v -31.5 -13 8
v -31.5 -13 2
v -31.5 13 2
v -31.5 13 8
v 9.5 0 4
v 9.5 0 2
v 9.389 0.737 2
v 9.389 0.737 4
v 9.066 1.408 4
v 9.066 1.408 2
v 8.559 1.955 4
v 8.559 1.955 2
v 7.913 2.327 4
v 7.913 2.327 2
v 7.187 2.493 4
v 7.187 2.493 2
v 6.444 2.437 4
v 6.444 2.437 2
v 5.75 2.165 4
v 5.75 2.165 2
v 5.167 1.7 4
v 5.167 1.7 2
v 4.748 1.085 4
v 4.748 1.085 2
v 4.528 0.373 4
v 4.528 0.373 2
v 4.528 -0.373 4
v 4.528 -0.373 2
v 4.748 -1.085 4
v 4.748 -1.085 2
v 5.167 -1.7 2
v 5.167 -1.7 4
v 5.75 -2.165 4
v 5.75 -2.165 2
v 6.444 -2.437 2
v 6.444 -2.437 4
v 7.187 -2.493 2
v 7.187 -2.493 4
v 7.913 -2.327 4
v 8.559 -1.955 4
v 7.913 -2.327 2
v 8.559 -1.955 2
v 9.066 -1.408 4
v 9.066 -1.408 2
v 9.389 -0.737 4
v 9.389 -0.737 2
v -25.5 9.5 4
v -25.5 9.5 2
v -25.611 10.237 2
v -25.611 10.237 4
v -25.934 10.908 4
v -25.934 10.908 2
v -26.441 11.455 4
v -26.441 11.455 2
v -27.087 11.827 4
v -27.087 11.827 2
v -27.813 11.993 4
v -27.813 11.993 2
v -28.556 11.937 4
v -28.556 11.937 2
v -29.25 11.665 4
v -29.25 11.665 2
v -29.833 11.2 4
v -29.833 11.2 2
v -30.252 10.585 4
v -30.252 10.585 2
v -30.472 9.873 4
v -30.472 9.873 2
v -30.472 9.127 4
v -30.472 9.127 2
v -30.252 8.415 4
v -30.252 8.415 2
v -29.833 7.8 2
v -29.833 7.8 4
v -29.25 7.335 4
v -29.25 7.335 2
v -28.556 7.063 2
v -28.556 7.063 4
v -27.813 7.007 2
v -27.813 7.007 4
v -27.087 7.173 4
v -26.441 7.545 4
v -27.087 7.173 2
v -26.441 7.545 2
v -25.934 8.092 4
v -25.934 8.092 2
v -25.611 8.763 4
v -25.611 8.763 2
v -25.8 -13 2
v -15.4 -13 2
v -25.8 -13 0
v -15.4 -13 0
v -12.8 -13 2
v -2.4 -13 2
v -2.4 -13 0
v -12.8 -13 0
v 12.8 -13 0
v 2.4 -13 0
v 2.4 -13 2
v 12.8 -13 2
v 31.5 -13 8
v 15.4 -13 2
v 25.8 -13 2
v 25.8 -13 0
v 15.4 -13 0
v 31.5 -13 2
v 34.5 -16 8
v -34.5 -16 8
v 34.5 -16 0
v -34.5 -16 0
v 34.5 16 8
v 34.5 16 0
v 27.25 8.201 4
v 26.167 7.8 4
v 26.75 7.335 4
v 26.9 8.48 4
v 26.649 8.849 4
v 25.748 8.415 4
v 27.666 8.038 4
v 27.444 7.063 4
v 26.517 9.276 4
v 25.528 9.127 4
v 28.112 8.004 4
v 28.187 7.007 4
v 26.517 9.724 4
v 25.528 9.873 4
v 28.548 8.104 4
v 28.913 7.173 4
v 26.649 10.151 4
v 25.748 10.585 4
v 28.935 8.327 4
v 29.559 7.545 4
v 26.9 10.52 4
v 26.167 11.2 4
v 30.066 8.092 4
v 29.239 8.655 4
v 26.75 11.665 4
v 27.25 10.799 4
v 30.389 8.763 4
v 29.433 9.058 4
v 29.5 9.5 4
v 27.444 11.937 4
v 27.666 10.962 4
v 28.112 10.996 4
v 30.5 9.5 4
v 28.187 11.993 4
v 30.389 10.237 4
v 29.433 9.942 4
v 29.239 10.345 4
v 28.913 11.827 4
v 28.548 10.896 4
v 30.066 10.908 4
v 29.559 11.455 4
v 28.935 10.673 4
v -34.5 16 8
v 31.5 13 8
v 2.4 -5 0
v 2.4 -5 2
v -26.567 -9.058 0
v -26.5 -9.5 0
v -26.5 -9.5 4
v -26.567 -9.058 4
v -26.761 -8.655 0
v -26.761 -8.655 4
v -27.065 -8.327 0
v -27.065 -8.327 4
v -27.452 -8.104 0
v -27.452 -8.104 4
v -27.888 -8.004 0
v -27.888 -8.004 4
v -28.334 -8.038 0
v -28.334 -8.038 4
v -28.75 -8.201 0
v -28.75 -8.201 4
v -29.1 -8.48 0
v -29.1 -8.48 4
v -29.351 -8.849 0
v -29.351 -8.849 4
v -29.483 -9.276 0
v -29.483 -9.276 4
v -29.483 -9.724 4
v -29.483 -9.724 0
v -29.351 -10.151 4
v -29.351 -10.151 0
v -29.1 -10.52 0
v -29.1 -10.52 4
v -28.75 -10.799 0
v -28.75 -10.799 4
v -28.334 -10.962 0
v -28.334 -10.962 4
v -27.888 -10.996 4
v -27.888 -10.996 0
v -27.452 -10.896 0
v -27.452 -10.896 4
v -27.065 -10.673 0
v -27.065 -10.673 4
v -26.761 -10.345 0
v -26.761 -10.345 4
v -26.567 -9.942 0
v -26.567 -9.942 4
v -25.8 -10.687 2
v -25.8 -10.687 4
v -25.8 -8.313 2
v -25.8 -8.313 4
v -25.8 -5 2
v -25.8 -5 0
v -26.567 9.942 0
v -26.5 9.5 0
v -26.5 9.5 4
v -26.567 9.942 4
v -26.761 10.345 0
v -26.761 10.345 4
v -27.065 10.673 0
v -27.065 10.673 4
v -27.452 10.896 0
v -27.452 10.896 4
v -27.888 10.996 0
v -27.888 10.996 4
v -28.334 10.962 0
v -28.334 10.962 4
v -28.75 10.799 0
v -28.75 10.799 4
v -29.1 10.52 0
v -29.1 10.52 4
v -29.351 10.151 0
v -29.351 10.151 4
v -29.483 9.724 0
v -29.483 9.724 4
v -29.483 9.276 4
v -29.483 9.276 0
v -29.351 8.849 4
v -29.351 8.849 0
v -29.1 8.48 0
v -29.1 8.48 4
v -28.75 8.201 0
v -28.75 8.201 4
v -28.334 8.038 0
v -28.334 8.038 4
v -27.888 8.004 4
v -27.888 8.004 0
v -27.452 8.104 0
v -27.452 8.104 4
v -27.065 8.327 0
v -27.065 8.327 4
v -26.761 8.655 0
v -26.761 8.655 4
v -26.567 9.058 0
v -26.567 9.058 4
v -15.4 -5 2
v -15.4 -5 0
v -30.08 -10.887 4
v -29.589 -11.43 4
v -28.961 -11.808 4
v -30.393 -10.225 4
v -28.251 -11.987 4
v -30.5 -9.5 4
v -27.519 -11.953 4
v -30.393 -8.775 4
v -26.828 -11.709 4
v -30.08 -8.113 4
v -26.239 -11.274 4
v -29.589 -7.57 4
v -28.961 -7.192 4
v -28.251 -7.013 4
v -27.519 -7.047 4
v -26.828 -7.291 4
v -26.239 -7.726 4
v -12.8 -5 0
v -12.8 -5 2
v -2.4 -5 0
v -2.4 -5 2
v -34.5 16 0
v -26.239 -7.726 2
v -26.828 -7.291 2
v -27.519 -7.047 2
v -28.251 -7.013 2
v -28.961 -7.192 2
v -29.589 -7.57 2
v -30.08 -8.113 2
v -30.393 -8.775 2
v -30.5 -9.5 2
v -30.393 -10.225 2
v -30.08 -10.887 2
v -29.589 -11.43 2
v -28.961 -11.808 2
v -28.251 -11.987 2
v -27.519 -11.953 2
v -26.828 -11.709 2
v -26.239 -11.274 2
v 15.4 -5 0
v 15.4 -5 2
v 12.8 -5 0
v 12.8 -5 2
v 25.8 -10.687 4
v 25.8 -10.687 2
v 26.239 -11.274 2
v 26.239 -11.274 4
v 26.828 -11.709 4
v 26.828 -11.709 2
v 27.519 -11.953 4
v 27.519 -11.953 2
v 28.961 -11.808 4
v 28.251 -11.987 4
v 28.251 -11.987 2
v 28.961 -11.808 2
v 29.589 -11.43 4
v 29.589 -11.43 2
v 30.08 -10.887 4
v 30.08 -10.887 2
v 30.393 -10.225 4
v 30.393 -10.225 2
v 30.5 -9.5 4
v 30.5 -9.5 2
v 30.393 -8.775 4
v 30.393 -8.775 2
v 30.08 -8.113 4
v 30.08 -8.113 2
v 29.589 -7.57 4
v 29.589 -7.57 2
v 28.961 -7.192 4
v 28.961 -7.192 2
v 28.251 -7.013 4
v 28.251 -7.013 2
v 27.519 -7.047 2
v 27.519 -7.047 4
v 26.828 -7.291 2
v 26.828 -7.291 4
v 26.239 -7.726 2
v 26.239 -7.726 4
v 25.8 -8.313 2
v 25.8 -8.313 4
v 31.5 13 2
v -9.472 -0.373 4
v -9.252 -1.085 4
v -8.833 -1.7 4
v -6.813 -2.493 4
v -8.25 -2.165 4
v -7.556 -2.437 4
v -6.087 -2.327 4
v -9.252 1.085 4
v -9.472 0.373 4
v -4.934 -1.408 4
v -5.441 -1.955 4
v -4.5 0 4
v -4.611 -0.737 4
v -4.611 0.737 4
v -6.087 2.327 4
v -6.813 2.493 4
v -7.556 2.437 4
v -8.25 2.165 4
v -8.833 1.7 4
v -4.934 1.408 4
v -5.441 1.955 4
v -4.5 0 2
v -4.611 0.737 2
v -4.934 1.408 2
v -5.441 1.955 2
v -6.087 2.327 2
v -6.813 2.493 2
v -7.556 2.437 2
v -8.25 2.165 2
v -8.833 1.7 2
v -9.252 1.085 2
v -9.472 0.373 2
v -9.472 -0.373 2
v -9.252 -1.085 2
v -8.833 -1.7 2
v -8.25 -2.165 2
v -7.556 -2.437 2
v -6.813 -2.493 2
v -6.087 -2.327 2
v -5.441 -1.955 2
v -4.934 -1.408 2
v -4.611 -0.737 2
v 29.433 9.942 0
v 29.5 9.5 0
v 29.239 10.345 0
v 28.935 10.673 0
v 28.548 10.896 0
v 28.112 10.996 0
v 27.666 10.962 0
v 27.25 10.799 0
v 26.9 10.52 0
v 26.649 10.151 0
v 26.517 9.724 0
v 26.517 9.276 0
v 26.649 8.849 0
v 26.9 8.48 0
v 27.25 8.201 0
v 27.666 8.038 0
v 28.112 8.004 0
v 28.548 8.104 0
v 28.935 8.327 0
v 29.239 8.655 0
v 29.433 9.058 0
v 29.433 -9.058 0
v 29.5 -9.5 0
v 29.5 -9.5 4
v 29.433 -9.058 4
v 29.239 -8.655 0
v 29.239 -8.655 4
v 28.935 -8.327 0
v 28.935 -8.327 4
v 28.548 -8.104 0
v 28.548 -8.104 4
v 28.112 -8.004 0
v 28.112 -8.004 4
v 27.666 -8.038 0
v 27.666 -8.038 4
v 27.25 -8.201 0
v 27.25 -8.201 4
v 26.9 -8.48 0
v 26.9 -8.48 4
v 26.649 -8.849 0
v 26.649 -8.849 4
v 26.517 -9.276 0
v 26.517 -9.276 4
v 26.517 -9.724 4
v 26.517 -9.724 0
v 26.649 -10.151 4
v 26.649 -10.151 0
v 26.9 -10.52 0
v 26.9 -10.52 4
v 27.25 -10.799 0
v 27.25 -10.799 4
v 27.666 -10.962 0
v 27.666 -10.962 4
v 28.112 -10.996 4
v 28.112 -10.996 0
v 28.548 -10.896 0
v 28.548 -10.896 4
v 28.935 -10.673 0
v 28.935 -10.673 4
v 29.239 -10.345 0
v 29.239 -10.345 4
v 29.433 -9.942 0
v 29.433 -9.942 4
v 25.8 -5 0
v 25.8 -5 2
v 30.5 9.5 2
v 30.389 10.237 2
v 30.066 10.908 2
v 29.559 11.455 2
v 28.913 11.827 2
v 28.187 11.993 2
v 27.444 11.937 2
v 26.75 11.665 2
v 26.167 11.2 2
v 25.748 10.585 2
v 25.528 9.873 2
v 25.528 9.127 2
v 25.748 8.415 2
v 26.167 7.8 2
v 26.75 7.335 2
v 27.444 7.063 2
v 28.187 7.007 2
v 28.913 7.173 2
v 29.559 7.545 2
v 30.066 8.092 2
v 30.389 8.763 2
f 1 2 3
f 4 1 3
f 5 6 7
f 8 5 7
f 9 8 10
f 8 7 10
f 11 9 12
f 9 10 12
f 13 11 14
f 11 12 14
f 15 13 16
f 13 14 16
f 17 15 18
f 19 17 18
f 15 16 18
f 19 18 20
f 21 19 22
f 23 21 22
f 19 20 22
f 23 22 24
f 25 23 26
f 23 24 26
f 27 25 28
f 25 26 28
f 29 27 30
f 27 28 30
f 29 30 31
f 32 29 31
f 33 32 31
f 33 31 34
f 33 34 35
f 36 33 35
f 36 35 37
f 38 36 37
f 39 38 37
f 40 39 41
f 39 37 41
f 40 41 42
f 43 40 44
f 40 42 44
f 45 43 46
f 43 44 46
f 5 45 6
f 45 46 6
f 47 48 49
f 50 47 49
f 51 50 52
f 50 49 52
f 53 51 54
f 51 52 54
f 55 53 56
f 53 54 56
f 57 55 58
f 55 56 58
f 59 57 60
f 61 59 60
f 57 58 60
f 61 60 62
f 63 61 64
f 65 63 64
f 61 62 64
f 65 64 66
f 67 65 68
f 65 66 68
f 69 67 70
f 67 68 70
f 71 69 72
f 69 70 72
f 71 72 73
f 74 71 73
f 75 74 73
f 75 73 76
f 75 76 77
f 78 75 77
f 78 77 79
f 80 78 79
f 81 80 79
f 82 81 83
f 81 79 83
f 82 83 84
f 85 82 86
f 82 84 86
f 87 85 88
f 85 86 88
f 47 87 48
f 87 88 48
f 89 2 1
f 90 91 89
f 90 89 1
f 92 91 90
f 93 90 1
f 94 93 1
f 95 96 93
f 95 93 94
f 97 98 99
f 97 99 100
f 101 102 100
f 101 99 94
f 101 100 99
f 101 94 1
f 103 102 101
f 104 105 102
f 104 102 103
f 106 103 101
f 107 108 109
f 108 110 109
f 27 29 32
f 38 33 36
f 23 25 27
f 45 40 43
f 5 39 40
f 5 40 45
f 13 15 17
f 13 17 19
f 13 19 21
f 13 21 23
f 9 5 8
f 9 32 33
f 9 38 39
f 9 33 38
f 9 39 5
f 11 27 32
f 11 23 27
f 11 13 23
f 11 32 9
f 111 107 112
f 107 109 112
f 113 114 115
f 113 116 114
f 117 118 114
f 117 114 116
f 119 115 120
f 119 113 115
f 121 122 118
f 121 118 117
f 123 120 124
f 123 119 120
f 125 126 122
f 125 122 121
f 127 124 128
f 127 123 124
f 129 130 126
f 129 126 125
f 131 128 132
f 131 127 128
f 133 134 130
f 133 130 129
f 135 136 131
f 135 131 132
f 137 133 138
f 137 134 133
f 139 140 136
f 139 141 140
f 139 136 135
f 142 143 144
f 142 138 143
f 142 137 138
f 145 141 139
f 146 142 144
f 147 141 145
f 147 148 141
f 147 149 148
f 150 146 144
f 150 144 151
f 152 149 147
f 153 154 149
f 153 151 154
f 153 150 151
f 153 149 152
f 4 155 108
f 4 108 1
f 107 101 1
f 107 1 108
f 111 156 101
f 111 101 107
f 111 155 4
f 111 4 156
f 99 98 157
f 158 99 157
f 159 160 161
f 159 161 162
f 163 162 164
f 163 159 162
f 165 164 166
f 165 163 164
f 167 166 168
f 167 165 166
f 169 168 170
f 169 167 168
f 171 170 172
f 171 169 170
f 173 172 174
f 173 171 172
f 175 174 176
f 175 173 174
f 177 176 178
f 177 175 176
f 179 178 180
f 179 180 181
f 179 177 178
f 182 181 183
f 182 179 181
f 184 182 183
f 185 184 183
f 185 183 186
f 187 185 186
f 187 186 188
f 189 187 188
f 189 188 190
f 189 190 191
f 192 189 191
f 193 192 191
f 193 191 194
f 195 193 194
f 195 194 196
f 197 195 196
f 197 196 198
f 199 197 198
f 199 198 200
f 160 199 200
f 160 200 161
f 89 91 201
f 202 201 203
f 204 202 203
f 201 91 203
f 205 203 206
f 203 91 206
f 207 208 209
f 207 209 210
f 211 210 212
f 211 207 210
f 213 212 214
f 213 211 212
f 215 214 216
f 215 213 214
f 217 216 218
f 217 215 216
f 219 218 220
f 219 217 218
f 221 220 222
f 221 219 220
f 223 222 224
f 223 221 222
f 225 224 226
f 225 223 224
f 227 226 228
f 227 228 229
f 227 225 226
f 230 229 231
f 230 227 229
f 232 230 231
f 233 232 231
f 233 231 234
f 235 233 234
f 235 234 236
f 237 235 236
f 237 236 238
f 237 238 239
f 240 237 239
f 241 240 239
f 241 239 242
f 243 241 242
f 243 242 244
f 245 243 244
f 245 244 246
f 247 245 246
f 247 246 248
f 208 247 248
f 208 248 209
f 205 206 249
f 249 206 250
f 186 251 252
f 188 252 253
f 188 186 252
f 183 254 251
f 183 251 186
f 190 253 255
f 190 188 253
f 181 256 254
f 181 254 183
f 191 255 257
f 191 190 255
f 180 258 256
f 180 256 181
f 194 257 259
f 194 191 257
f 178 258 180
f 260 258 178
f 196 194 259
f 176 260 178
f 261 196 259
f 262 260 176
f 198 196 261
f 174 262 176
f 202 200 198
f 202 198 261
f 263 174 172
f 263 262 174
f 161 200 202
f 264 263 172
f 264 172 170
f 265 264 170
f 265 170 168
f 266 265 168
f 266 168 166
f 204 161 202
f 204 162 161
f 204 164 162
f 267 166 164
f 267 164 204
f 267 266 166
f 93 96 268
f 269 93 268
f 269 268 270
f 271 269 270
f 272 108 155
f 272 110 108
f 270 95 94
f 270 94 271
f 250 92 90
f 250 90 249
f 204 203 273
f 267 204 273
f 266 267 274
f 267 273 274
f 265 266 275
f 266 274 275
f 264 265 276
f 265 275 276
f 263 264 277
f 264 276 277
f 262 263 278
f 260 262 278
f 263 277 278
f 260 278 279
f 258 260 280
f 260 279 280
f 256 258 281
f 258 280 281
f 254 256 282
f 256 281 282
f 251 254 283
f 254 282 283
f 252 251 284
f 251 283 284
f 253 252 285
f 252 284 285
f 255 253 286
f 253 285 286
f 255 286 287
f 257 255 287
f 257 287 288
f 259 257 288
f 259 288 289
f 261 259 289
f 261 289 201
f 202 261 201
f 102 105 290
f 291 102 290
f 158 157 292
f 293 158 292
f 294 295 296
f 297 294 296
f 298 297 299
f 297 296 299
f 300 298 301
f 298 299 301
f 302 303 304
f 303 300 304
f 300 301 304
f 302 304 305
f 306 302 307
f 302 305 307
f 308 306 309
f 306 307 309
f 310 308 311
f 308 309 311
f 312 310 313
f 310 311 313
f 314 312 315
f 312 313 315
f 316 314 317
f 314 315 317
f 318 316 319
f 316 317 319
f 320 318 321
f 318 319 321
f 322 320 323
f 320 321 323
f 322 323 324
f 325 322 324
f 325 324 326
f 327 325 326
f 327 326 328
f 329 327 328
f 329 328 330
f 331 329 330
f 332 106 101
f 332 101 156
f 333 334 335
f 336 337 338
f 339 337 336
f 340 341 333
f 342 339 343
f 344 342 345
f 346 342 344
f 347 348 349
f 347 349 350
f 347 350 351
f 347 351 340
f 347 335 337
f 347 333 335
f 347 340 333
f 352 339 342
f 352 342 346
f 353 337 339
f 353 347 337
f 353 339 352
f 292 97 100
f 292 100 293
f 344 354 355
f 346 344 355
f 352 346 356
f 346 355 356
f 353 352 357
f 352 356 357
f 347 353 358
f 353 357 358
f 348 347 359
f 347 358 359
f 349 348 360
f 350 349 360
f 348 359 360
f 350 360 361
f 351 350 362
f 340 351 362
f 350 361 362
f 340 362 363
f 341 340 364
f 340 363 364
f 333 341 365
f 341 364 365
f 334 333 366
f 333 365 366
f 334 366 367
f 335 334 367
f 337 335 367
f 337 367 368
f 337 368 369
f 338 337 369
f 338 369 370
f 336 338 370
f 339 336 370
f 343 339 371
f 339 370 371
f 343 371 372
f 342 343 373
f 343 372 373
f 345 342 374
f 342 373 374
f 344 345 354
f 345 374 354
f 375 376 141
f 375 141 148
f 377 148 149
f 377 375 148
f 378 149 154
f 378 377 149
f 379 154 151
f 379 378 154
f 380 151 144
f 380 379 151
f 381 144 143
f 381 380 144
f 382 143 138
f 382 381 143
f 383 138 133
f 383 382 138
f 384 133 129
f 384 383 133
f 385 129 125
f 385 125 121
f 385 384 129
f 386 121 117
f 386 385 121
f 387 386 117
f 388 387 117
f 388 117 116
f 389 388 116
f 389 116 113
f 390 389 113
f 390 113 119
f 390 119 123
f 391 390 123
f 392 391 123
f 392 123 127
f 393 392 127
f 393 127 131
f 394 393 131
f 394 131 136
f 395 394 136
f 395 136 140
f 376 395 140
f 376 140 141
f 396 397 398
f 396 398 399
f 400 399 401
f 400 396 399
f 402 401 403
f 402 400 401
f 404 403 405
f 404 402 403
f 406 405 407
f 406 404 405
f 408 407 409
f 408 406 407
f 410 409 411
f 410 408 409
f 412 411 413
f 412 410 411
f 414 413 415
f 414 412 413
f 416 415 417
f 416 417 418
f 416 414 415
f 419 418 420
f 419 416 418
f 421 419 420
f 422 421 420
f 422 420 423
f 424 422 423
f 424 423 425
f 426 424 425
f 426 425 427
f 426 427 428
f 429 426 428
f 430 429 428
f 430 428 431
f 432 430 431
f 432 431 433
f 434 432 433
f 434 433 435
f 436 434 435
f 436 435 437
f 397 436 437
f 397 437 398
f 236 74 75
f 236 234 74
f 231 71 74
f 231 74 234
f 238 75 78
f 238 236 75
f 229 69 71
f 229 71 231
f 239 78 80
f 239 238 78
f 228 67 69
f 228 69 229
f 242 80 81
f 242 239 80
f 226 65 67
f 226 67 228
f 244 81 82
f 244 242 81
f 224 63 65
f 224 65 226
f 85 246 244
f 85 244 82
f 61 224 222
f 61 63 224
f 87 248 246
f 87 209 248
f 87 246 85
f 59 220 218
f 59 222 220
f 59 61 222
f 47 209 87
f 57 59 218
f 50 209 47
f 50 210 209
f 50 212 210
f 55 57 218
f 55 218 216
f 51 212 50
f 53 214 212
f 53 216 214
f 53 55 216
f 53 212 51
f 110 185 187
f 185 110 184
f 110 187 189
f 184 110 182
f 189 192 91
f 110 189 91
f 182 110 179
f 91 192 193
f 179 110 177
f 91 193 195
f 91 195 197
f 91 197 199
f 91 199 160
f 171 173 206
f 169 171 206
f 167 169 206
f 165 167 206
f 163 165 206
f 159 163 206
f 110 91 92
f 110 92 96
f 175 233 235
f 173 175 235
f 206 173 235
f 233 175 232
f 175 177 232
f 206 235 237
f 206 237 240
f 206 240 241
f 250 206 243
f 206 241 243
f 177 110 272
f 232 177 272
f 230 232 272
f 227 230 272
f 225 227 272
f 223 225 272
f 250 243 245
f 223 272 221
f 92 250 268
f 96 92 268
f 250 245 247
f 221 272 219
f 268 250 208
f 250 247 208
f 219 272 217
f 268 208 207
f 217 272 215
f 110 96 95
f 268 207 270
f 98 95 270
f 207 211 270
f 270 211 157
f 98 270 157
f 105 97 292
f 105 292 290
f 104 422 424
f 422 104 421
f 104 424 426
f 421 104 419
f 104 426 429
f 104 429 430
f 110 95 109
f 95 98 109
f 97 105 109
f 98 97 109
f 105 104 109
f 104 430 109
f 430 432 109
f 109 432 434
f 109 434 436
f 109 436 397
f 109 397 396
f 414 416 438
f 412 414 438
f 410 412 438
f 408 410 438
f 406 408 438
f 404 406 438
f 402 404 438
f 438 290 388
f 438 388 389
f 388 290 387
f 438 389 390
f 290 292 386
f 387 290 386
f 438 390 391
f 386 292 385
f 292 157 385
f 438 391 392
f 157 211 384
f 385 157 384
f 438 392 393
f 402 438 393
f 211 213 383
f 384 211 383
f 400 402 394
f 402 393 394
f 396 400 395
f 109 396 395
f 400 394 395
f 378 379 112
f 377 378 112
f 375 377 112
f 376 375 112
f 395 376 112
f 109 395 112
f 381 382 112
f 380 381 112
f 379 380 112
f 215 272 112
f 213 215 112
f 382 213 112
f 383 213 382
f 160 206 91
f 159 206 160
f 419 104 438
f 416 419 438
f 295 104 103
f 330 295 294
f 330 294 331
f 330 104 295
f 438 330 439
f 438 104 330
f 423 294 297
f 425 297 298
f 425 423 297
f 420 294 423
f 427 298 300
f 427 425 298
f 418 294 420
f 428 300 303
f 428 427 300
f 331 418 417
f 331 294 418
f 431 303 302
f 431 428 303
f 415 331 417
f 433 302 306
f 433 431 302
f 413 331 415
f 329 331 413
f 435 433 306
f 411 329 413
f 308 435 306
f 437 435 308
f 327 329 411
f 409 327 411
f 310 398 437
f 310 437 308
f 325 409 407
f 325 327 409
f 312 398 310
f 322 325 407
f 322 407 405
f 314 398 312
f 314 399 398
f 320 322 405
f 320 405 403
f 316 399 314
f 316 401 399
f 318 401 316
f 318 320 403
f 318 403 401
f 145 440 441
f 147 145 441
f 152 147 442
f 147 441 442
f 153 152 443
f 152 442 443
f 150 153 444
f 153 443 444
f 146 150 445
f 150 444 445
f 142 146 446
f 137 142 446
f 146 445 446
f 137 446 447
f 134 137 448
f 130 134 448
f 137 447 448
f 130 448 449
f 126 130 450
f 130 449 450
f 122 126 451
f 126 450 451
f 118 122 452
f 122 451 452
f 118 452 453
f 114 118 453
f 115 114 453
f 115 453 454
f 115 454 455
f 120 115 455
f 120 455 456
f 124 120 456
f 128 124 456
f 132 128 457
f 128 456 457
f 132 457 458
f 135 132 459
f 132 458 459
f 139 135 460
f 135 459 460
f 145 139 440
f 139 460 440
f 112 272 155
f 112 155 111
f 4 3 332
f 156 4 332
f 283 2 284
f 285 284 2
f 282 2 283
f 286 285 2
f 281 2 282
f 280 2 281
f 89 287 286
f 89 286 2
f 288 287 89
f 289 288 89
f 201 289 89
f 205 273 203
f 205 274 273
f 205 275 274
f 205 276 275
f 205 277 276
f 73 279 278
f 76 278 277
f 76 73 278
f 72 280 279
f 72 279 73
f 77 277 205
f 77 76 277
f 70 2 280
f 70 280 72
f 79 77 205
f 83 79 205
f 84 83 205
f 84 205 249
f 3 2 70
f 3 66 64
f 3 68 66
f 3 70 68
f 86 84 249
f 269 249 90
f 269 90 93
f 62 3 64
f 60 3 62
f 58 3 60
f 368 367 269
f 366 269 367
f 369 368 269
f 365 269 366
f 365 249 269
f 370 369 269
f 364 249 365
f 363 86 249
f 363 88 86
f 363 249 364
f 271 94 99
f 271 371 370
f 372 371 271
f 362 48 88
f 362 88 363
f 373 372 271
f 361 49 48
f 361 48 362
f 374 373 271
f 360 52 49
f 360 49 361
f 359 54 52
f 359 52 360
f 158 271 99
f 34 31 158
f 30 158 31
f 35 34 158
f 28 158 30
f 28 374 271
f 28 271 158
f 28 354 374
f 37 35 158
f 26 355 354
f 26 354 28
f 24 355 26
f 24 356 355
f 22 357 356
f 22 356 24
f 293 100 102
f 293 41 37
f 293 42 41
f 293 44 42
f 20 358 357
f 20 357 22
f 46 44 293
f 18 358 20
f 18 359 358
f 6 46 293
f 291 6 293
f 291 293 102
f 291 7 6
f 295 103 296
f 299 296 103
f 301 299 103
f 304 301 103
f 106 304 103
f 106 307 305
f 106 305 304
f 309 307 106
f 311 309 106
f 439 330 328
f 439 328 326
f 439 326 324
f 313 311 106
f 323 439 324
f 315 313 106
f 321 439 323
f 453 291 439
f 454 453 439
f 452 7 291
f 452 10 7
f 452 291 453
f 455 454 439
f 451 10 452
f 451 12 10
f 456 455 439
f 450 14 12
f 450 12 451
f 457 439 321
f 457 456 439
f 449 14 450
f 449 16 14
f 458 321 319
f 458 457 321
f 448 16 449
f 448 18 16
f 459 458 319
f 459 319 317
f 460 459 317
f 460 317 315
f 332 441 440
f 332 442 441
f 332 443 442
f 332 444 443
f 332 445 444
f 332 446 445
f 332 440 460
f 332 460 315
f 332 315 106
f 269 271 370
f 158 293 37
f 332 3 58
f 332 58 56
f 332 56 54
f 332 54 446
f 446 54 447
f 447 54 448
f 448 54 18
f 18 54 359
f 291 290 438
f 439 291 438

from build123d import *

# Parameters (mm, degrees)
SKETCH1_W               = 69
SKETCH1_H               = 32
BOSS_EXTRUDE1_DEPTH     = 2
SKETCH2_W               = 69
SKETCH2_H               = 32
SKETCH2_W_2             = 63
SKETCH2_H_2             = 26
BOSS_EXTRUDE2_DEPTH     = 6
SKETCH3_R               = 2.5
SKETCH3_R_2             = 1.5
BOSS_EXTRUDE3_DEPTH     = 2
CUT_EXTRUDE1_DEPTH      = 39.5
CUT_EXTRUDE1_DEPTH_BACK = 39.5
SKETCH4_R               = 1.5
SKETCH4_W               = 10.4
SKETCH4_H               = 8


with BuildPart() as part:
    # Sketch1 → Boss-Extrude1 (new body)
    with BuildSketch(Plane.XY):
        Rectangle(SKETCH1_W, SKETCH1_H)
    extrude(amount=BOSS_EXTRUDE1_DEPTH)

    # Sketch2 → Boss-Extrude2 (add)
    with BuildSketch(Plane.XY.offset(2)):
        Rectangle(SKETCH2_W, SKETCH2_H)
        Rectangle(SKETCH2_W_2, SKETCH2_H_2, mode=Mode.SUBTRACT)
    extrude(amount=BOSS_EXTRUDE2_DEPTH)

    # Sketch3 → Boss-Extrude3 (add)
    # profile 1 of 6: a face of its own
    with BuildSketch(Plane.XY.offset(2)):
        with Locations((-28, 9.5)):
            Circle(SKETCH3_R)
        with Locations((-28, 9.5)):
            Circle(SKETCH3_R_2, mode=Mode.SUBTRACT)
    # profile 2 of 6: a face of its own
    with BuildSketch(Plane.XY.offset(2)):
        with Locations((-28, -9.5)):
            Circle(SKETCH3_R)
        with Locations((-28, -9.5)):
            Circle(SKETCH3_R_2, mode=Mode.SUBTRACT)
    # profile 3 of 6: a face of its own
    with BuildSketch(Plane.XY.offset(2)):
        with Locations((28, -9.5)):
            Circle(SKETCH3_R)
        with Locations((28, -9.5)):
            Circle(SKETCH3_R_2, mode=Mode.SUBTRACT)
    # profile 4 of 6: a face of its own
    with BuildSketch(Plane.XY.offset(2)):
        with Locations((28, 9.5)):
            Circle(SKETCH3_R)
        with Locations((28, 9.5)):
            Circle(SKETCH3_R_2, mode=Mode.SUBTRACT)
    # profile 5 of 6: a face of its own
    with BuildSketch(Plane.XY.offset(2)):
        with Locations((-7, 0)):
            Circle(SKETCH3_R)
    # profile 6 of 6: a face of its own
    with BuildSketch(Plane.XY.offset(2)):
        with Locations((7, 0)):
            Circle(SKETCH3_R)
    extrude(amount=BOSS_EXTRUDE3_DEPTH)

    # Sketch4 → Cut-Extrude1 (cut, two sides: drawn at the far end of the back side and taken through both)
    with BuildSketch(Plane.XY.offset(2).offset(-CUT_EXTRUDE1_DEPTH_BACK)):
        with Locations((28, 9.5)):
            Circle(SKETCH4_R)
        with Locations((28, -9.5)):
            Circle(SKETCH4_R)
        with Locations((-28, -9.5)):
            Circle(SKETCH4_R)
        with Locations((-28, 9.5)):
            Circle(SKETCH4_R)
        with Locations((-20.6, -9)):
            Rectangle(SKETCH4_W, SKETCH4_H)
        with Locations((-7.6, -9)):
            Rectangle(SKETCH4_W, SKETCH4_H)
        with Locations((7.6, -9)):
            Rectangle(SKETCH4_W, SKETCH4_H)
        with Locations((20.6, -9)):
            Rectangle(SKETCH4_W, SKETCH4_H)
    extrude(amount=CUT_EXTRUDE1_DEPTH + CUT_EXTRUDE1_DEPTH_BACK, mode=Mode.SUBTRACT)


solid = part.part
